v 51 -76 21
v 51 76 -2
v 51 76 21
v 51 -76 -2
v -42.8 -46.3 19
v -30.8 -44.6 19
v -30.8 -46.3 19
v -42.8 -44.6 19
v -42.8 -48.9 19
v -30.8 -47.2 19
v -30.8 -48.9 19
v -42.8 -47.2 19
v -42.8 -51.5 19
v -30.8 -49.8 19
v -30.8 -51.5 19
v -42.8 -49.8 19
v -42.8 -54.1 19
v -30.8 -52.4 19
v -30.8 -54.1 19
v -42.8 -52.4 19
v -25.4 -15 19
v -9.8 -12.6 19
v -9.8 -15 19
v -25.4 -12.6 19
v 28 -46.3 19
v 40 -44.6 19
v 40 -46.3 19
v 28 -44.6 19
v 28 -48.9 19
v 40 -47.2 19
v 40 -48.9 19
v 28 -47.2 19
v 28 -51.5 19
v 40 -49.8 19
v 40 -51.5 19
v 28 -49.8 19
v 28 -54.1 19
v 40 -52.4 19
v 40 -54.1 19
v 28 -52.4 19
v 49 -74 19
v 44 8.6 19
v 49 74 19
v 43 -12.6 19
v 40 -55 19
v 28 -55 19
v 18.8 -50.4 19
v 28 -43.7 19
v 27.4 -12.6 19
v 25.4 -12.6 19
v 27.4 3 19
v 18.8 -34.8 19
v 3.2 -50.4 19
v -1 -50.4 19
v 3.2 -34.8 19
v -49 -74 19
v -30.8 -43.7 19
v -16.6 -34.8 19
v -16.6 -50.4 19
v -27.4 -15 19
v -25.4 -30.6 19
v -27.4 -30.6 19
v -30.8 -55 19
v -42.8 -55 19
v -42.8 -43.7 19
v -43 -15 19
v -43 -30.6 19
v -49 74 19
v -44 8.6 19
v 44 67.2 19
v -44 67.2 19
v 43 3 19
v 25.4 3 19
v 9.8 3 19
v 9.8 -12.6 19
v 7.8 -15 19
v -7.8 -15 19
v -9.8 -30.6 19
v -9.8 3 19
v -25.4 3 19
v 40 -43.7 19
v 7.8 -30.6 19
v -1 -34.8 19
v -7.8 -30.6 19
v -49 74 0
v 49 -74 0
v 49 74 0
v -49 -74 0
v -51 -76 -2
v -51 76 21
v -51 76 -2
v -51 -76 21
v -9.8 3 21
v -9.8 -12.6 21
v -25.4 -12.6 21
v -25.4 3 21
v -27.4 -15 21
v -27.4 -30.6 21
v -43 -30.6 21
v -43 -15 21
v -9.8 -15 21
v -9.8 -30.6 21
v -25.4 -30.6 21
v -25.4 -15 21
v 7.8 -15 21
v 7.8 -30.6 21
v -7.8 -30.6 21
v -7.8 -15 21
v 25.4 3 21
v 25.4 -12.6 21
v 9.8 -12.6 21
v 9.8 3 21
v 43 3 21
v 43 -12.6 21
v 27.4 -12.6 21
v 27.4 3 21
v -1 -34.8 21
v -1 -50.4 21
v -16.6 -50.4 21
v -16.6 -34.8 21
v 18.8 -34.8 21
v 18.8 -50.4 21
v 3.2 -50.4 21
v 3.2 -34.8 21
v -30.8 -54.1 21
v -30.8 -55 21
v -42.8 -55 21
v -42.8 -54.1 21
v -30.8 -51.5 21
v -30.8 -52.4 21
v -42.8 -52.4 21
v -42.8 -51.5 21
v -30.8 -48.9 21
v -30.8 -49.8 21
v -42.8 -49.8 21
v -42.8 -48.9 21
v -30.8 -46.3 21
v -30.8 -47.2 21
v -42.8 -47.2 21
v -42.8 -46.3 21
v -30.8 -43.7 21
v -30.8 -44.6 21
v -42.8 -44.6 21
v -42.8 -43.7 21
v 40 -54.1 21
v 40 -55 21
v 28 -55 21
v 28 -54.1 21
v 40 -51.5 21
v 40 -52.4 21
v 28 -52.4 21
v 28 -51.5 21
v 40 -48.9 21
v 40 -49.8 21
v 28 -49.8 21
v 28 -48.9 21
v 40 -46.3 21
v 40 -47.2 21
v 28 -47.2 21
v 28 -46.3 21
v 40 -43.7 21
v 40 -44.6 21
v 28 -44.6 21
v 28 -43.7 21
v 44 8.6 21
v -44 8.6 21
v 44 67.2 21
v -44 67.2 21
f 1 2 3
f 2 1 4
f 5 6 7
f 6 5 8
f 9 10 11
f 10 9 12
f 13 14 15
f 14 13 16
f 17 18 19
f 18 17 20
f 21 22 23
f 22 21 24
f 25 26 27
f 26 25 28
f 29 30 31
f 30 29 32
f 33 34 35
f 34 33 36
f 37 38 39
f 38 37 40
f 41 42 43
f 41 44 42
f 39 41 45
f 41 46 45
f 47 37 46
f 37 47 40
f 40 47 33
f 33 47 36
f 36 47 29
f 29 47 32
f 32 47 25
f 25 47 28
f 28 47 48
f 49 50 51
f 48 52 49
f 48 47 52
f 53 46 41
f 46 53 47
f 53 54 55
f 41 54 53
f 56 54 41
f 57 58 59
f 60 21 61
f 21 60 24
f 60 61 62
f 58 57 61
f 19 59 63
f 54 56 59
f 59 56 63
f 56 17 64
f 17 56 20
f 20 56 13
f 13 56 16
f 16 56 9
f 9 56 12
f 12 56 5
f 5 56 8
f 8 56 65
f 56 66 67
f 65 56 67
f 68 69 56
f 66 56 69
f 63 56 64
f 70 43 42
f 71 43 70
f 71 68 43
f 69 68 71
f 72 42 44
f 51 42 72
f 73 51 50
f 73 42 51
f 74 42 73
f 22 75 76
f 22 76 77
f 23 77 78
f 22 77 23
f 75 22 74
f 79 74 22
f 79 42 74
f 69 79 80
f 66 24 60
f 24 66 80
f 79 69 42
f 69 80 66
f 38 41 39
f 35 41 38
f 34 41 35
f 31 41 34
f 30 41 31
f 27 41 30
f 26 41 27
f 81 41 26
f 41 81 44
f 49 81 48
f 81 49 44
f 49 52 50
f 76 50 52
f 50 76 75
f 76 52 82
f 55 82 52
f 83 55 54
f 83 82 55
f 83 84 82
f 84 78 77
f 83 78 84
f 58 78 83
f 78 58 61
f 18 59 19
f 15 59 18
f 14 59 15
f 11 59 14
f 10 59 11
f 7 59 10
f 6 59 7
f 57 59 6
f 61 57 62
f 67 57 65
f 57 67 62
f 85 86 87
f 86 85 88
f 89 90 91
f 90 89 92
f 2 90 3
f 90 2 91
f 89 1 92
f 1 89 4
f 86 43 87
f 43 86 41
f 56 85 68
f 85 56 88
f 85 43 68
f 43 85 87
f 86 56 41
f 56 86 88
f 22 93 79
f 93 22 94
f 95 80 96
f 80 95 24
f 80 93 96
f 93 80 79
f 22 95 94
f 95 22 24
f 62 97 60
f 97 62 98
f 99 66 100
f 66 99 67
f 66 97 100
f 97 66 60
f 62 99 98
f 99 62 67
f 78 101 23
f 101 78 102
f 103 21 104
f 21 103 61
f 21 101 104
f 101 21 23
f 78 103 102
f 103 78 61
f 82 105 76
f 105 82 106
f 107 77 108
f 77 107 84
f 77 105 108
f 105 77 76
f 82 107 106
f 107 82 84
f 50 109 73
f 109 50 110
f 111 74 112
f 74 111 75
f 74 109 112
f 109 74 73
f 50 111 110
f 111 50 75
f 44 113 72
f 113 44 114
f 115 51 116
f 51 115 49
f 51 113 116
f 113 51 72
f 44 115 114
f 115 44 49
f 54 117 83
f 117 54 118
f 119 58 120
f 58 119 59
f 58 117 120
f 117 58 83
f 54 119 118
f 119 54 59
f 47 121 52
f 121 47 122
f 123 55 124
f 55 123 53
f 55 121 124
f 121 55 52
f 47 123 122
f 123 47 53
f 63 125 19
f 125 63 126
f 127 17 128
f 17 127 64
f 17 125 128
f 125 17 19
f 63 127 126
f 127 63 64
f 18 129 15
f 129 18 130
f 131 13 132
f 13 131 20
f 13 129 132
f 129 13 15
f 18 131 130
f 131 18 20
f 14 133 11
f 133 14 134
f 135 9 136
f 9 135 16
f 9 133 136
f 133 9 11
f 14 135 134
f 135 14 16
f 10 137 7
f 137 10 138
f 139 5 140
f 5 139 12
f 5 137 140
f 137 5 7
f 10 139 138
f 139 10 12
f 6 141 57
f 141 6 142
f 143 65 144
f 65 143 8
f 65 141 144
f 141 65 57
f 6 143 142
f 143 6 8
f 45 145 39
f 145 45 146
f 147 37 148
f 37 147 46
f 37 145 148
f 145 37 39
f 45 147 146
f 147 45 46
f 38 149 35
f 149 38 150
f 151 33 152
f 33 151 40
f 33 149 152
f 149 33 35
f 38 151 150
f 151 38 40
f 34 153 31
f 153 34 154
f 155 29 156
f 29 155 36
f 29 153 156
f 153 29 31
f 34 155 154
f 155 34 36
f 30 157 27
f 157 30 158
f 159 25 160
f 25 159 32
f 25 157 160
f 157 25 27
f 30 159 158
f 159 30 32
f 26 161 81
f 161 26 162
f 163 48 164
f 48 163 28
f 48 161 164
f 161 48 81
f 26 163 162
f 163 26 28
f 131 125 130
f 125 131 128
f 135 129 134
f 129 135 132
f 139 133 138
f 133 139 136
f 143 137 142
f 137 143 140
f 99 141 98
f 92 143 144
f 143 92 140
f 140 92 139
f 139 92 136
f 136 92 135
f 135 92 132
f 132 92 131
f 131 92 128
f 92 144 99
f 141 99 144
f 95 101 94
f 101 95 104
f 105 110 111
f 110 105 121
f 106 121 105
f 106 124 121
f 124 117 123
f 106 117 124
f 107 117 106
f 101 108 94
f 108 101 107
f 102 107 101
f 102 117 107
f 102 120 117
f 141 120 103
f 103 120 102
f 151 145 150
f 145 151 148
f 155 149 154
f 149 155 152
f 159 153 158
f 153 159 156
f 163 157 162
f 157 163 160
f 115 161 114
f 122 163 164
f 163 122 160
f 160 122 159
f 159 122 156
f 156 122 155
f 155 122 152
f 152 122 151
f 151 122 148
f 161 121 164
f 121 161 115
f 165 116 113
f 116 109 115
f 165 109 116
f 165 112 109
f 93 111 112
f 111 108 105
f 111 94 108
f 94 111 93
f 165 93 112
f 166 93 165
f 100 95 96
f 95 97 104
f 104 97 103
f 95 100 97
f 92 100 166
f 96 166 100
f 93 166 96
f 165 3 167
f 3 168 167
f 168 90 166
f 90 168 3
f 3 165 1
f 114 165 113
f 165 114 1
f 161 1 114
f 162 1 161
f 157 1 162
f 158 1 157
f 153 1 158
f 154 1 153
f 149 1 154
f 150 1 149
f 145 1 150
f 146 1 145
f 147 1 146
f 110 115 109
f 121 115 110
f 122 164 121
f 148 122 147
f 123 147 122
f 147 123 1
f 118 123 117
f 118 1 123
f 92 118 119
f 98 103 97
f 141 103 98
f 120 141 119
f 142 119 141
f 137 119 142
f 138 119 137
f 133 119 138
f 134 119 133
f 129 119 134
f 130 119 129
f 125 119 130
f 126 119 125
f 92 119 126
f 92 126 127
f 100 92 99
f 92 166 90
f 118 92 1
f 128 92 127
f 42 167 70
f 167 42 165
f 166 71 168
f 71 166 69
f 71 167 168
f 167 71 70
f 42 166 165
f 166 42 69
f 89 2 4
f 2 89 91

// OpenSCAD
// M8 / BUILD original visual concept, 2026-09-13.
// NOT manufacturing-ready. Dimensions below are illustrative only.
// No confirmed display holes, PCB mounts, cable exits or thermal validation.
// Adapt with actual module drawings before any final print.
// Model:02 inspired; not Dirtywave CAD. All values in nominal mm.
width=102;
height=152;
depth=19;
wall=2;
exploded=0; // preview separation, mm
part="assembly"; // assembly / front / back / shell / button-test
screen_w=88; // placeholder, measure selected HDMI module
screen_h=58.6;
switch_hole=15.6; // placeholder, not a Kailh verified footprint
keys=[[-17.6,-4.8],[-35.2,-22.8],[-17.6,-22.8],[0,-22.8],[17.6,-4.8],[35.2,-4.8],[-8.8,-42.6],[11,-42.6]];
module front(){difference(){translate([-width/2,-height/2,0])cube([width,height,wall]);translate([-screen_w/2,8.6,-1])cube([screen_w,screen_h,wall+2]);for(p=keys)translate([p[0]-switch_hole/2,p[1]-switch_hole/2,-1])cube([switch_hole,switch_hole,wall+2]);for(x=[-36.8,34])for(i=[0:4])translate([x-6,-55+i*2.6,-1])cube([12,.9,wall+2]);}}
module shell(){difference(){translate([-width/2,-height/2,0])cube([width,height,depth]);translate([-width/2+wall,-height/2+wall,-1])cube([width-2*wall,height-2*wall,depth+2]);}}
module back(){translate([-width/2,-height/2,0])cube([width,height,wall]);}
module button_test(){difference(){cube([28,28,wall]);translate([(28-switch_hole)/2,(28-switch_hole)/2,-1])cube([switch_hole,switch_hole,wall+2]);}}
if(part=="front")front();
else if(part=="back")back();
else if(part=="shell")shell();
else if(part=="button-test")button_test();
else {color("#303333")shell();color("#202424")translate([0,0,-wall-exploded])back();color("#303333")translate([0,0,depth+exploded])front();}
